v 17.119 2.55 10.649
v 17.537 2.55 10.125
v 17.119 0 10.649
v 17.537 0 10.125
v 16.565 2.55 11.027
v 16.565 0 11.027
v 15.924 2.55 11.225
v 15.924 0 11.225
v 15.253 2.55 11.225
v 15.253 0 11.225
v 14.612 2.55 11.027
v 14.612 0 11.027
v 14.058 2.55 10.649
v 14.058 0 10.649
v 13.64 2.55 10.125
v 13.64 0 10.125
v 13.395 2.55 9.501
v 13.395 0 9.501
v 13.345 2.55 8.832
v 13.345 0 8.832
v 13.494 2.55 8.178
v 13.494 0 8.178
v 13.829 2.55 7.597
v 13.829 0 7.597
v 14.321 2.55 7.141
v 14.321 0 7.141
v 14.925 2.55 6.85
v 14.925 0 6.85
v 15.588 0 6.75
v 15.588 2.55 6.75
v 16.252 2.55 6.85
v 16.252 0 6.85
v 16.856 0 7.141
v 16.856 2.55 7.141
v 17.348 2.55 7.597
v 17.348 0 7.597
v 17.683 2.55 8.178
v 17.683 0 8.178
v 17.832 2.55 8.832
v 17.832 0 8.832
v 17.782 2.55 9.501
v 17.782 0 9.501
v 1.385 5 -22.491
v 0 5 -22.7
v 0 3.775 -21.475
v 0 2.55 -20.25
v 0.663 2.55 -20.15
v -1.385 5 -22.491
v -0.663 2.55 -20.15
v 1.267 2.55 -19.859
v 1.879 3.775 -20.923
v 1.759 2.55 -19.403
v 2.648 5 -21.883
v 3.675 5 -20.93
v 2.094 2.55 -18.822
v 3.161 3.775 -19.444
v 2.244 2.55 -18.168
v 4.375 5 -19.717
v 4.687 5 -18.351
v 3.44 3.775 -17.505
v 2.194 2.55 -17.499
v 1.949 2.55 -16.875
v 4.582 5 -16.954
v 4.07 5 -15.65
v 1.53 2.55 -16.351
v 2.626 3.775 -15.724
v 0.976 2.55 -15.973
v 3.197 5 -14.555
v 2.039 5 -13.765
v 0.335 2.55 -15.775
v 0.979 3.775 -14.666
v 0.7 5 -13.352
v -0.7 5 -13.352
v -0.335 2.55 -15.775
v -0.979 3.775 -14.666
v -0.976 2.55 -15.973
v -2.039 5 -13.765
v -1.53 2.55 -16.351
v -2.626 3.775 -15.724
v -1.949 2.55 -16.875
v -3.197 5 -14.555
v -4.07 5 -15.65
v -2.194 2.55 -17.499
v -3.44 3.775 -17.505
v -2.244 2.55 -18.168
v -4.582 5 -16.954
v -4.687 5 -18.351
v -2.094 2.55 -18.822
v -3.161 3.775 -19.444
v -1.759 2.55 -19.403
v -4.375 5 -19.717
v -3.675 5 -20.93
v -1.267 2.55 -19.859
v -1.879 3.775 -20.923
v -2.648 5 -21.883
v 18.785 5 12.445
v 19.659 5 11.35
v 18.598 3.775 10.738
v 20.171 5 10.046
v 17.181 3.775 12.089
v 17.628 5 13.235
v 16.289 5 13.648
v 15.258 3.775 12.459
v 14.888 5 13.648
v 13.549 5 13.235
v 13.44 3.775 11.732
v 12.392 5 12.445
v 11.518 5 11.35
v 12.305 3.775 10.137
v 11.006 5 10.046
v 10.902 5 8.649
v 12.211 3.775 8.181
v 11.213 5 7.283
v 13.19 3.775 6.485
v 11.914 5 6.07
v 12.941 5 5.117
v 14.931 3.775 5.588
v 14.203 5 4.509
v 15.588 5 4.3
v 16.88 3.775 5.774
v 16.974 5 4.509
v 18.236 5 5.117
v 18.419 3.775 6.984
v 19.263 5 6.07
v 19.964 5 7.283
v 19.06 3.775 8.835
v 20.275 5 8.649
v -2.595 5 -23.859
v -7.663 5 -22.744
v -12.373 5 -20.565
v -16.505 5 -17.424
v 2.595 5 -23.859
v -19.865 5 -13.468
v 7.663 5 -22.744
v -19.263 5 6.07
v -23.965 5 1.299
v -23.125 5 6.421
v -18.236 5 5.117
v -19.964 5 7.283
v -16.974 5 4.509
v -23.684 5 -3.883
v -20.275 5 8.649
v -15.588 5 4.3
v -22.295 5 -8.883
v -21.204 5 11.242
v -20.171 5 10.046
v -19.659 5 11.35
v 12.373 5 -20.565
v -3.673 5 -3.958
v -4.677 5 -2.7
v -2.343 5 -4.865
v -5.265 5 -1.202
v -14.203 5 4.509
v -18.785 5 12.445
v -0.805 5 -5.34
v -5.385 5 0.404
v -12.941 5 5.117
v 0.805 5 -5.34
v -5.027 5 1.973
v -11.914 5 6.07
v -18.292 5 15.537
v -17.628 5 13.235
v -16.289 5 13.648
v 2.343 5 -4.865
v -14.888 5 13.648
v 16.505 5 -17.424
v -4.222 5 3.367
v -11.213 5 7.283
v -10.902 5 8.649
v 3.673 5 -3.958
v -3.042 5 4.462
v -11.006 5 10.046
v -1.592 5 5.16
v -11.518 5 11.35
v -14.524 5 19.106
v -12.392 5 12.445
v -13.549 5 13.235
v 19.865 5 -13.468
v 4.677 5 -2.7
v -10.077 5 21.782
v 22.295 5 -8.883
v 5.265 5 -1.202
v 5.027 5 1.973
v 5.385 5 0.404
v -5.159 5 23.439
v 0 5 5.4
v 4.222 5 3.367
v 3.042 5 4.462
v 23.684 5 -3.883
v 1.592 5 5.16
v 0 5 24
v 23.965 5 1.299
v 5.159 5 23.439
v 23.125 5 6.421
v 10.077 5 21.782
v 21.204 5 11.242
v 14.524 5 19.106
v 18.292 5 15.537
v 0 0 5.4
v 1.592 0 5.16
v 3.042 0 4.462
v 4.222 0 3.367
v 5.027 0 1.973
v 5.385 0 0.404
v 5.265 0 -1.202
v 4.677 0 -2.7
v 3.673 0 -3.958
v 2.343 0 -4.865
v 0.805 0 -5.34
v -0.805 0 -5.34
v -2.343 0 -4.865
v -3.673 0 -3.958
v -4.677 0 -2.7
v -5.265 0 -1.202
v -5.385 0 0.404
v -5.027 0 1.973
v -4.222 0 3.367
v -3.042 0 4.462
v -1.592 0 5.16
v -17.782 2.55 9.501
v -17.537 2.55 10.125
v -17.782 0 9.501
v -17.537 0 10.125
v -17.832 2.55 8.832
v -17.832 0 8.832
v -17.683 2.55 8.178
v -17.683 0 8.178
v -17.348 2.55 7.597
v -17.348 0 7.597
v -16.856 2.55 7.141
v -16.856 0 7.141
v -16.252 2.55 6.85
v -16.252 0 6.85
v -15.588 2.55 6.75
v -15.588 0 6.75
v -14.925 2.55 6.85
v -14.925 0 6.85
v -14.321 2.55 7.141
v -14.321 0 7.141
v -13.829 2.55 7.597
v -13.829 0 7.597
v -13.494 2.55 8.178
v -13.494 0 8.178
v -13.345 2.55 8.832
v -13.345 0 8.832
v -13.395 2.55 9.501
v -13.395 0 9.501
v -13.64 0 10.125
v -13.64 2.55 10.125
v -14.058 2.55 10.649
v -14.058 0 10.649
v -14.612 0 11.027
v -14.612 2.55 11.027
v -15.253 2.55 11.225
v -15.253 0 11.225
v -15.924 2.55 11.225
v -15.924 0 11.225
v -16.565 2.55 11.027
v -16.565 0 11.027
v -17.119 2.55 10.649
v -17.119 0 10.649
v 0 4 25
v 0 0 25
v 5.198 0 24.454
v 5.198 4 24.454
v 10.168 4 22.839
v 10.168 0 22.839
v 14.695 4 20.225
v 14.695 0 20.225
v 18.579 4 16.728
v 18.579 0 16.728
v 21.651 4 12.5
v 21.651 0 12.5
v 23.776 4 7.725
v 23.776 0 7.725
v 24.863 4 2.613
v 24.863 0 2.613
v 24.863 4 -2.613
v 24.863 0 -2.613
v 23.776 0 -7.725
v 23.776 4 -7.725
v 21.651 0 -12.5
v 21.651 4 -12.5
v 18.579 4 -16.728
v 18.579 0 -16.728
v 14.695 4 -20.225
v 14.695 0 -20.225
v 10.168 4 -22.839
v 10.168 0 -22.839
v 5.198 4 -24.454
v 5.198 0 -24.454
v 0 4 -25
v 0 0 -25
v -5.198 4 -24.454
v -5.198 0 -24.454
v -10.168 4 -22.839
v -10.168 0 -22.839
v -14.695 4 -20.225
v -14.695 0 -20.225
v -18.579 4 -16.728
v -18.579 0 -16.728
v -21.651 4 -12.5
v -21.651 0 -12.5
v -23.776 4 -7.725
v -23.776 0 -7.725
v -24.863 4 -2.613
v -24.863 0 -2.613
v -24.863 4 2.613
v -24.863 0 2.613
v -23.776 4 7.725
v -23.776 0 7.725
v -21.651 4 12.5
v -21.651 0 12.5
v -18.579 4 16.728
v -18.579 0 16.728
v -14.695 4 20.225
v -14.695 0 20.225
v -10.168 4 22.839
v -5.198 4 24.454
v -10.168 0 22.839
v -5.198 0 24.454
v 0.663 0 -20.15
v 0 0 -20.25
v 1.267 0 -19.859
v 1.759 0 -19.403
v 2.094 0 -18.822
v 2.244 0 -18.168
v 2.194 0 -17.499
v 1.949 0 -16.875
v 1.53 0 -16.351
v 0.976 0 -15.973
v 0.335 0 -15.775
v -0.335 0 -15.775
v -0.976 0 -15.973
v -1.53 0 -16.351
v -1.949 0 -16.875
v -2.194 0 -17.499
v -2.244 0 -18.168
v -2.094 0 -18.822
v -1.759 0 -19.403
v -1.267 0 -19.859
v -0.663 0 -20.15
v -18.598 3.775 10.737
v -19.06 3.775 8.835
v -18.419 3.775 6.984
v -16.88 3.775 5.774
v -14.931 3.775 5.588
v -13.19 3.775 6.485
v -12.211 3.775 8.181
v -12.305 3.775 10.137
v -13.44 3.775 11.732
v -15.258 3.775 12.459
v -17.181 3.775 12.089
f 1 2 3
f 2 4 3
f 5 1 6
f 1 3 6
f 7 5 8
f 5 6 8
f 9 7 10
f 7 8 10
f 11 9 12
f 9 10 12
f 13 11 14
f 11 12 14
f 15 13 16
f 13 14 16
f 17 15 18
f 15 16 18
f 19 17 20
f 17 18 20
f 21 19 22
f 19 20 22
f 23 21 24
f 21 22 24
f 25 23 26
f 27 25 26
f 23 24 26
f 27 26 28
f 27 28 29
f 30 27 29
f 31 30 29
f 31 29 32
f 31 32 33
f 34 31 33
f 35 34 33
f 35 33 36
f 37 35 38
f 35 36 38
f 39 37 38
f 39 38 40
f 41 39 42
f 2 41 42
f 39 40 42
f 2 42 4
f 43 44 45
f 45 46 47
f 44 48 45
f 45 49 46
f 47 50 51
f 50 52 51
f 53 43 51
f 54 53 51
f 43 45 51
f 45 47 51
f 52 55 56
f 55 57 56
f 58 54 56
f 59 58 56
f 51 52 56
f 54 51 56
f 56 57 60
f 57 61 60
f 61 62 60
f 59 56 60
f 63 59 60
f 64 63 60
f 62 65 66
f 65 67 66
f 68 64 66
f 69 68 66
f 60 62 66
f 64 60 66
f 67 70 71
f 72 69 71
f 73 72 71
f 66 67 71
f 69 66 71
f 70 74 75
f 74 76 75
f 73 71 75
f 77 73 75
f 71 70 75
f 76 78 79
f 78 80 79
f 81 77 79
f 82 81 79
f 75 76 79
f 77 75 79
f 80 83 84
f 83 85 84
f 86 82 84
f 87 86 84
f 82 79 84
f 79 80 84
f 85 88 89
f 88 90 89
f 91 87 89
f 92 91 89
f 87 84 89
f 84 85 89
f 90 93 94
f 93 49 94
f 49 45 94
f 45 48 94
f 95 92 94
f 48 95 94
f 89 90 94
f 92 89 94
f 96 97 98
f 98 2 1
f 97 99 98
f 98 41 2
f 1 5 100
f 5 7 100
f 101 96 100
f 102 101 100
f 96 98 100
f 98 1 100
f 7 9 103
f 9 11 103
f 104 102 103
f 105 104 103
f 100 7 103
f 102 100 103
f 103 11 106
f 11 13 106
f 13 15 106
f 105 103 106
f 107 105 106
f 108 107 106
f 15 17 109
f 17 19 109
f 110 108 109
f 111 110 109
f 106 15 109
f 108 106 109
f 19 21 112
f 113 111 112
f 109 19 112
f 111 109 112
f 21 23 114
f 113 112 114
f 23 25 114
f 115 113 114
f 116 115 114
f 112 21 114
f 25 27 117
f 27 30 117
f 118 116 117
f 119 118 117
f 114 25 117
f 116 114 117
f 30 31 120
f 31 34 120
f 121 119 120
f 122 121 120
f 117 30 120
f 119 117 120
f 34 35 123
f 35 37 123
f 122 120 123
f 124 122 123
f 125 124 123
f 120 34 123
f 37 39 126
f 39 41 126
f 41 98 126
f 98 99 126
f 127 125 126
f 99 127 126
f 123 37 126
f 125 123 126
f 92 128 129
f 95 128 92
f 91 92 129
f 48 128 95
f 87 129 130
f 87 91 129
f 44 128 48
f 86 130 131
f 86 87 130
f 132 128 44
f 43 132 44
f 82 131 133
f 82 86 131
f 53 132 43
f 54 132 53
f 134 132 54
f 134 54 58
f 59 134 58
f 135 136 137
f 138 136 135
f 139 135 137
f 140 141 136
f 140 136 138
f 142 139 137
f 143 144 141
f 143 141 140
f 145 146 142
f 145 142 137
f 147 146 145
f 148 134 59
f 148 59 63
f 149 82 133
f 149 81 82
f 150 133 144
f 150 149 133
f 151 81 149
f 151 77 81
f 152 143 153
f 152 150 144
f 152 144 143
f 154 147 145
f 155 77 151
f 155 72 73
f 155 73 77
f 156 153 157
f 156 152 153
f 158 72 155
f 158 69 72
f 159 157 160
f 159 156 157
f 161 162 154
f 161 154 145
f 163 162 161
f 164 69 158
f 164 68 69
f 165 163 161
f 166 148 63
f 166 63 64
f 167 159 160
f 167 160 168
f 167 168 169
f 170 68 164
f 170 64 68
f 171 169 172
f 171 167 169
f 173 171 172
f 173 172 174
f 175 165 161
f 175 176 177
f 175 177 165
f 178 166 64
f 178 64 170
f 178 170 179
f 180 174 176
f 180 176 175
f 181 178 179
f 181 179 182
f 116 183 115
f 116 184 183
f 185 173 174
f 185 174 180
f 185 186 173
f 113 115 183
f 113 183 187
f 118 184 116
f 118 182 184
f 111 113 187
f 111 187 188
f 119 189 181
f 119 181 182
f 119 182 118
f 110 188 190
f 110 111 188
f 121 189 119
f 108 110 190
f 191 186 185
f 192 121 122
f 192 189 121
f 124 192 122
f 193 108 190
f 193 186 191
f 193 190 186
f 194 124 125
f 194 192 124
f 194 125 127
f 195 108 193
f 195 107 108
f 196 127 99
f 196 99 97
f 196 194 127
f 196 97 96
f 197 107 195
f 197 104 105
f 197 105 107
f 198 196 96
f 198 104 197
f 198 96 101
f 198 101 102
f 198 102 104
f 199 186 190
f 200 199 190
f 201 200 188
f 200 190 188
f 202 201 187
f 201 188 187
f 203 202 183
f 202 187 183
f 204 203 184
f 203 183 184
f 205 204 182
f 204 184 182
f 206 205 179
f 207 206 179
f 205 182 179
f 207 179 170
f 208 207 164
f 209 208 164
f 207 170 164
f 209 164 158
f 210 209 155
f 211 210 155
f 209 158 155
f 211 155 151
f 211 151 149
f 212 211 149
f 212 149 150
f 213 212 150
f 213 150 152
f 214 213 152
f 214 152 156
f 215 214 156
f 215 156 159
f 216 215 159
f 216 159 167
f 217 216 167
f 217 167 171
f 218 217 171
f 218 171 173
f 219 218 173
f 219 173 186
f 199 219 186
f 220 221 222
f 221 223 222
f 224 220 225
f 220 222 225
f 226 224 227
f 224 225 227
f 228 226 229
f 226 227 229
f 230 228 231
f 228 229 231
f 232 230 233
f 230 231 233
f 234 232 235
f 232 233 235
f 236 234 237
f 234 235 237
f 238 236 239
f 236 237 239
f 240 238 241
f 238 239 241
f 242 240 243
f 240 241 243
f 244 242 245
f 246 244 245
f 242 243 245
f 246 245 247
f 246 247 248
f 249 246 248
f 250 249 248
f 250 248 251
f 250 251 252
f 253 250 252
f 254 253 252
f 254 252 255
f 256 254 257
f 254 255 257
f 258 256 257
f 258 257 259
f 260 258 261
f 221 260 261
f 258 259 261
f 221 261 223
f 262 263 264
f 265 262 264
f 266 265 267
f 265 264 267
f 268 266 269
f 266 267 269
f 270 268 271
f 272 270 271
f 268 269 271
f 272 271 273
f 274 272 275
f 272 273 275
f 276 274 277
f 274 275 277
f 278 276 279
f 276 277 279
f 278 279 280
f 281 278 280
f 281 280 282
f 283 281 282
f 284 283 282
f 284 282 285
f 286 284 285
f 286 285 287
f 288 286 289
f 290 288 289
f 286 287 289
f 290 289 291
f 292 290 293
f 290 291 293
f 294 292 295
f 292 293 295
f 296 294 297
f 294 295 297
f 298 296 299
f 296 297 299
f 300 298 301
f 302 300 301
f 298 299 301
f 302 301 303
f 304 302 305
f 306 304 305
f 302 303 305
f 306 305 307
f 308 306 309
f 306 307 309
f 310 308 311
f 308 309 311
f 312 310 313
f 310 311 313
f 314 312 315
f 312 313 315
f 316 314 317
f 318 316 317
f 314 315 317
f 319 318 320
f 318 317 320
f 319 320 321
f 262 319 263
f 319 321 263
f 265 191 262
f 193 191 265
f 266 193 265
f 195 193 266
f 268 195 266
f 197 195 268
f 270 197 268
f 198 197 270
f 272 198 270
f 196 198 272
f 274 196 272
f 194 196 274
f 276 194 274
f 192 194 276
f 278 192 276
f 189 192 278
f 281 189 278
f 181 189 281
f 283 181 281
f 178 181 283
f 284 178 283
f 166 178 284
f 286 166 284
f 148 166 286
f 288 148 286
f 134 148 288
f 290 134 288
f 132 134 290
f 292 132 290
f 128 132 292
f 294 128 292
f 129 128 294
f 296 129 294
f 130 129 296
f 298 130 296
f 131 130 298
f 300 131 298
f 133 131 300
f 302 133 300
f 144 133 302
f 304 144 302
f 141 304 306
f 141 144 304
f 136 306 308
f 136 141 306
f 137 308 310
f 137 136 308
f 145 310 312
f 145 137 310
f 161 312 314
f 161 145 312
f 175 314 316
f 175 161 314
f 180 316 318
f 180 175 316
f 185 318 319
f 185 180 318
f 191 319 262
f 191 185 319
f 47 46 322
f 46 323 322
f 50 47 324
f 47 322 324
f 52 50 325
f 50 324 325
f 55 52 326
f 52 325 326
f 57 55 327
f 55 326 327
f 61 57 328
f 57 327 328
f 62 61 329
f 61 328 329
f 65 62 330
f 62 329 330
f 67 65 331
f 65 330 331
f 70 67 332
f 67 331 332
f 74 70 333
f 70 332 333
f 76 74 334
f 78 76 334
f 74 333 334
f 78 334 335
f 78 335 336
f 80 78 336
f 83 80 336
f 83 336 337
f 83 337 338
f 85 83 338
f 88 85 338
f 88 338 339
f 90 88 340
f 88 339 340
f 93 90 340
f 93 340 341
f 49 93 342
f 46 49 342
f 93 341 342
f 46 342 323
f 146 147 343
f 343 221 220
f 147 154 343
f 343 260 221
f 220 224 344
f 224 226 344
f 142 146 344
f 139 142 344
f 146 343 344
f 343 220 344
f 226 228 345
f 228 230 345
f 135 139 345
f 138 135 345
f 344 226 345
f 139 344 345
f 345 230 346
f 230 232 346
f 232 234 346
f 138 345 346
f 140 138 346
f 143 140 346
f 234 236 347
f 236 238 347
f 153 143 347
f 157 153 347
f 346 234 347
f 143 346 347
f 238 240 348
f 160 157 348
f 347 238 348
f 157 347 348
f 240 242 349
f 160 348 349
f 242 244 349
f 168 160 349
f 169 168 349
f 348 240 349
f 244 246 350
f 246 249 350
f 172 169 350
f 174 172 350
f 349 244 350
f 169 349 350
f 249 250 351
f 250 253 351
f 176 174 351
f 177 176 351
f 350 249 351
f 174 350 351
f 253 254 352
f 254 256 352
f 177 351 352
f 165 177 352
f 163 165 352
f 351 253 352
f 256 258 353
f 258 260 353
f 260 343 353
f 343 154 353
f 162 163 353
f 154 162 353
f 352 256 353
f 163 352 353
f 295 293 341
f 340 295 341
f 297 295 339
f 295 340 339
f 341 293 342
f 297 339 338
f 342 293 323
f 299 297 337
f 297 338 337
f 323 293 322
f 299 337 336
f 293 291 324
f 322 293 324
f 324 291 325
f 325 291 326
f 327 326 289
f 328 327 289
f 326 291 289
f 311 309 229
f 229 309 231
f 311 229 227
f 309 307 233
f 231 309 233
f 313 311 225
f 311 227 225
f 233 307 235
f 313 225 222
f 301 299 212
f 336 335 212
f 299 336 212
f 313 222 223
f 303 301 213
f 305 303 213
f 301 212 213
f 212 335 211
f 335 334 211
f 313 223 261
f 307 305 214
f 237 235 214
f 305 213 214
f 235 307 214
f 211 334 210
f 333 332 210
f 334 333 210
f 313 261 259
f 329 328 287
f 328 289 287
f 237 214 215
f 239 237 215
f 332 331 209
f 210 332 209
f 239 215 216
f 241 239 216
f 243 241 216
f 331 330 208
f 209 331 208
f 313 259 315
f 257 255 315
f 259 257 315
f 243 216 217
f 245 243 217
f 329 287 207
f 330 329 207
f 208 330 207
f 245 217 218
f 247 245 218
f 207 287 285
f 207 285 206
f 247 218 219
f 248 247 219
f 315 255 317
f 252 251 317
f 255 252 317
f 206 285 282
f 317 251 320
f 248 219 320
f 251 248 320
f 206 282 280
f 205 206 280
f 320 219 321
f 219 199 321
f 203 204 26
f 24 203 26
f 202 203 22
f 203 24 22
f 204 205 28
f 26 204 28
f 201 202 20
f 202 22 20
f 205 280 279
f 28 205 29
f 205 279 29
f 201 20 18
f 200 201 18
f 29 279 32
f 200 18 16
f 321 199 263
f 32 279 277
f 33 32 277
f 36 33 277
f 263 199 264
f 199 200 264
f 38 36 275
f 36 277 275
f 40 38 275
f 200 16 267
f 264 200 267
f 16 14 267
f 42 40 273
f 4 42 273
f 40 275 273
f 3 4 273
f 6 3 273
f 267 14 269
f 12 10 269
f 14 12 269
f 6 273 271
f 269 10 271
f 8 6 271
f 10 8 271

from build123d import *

# Parameters (mm, degrees)
SKETCH1_R                                     = 25
BOSS_EXTRUDE1_DEPTH                           = 5
CHAMFER1_SIZE                                 = 1
CSK_FOR_M4_COUNTERSUNK_FLAT_HEAD1_D           = 4.5
CSK_FOR_M4_COUNTERSUNK_FLAT_HEAD1_CSINK_D     = 9.4
CSK_FOR_M4_COUNTERSUNK_FLAT_HEAD1_CSINK_ANGLE = 90
M12X1_25_TAPPED_HOLE1_D                       = 10.8
M12X1_25_TAPPED_HOLE1_ON_FACE_2_D             = 10.8
CIRPATTERN1_COUNT                             = 3


with BuildPart() as part:
    # Sketch1 → Boss-Extrude1 (new body)
    with BuildSketch(Plane(origin=(0, 0, 0), x_dir=(1, 0, 0), z_dir=(0, 1, 0))):
        with Locations(Location((0, 0, 0), (0, 0, 270))):
            Circle(SKETCH1_R)
    extrude(amount=BOSS_EXTRUDE1_DEPTH)

    # Chamfer1
    chamfer1_edges = [part.edges().sort_by_distance(p)[0] for p in [
        (0, 5, -25),
    ]]
    chamfer(chamfer1_edges, length=CHAMFER1_SIZE)

    # CSK for M4 Countersunk Flat Head1 (through all)
    with Locations(Plane(origin=(0, 5, -18), x_dir=(0, 0, 1), z_dir=(0, 1, 0))):
        with Locations((0, 0)):
            csk_for_m4_countersunk_flat_head1 = CounterSinkHole(CSK_FOR_M4_COUNTERSUNK_FLAT_HEAD1_D / 2, CSK_FOR_M4_COUNTERSUNK_FLAT_HEAD1_CSINK_D / 2, counter_sink_angle=CSK_FOR_M4_COUNTERSUNK_FLAT_HEAD1_CSINK_ANGLE)

    # M12x1.25 Tapped Hole1 (through all)
    with Locations(Plane(origin=(0, 0, 0), x_dir=(0, 0, -1), z_dir=(0, -1, 0))):
        with Locations((0, 0)):
            Hole(M12X1_25_TAPPED_HOLE1_D / 2)

    # M12x1.25 Tapped Hole1 on face 2 (through all)
    with Locations(Plane.ZX.offset(5)):
        with Locations((0, 0)):
            Hole(M12X1_25_TAPPED_HOLE1_ON_FACE_2_D / 2)

    # CirPattern1: CSK for M4 Countersunk Flat Head1 ×3 about axis
    cirpattern1_axis = Axis((0, 0, 0), (0, 1, 0))
    for i in range(1, CIRPATTERN1_COUNT):
        add(csk_for_m4_countersunk_flat_head1.rotate(cirpattern1_axis, i * 360 / CIRPATTERN1_COUNT), mode=Mode.SUBTRACT)


solid = part.part
